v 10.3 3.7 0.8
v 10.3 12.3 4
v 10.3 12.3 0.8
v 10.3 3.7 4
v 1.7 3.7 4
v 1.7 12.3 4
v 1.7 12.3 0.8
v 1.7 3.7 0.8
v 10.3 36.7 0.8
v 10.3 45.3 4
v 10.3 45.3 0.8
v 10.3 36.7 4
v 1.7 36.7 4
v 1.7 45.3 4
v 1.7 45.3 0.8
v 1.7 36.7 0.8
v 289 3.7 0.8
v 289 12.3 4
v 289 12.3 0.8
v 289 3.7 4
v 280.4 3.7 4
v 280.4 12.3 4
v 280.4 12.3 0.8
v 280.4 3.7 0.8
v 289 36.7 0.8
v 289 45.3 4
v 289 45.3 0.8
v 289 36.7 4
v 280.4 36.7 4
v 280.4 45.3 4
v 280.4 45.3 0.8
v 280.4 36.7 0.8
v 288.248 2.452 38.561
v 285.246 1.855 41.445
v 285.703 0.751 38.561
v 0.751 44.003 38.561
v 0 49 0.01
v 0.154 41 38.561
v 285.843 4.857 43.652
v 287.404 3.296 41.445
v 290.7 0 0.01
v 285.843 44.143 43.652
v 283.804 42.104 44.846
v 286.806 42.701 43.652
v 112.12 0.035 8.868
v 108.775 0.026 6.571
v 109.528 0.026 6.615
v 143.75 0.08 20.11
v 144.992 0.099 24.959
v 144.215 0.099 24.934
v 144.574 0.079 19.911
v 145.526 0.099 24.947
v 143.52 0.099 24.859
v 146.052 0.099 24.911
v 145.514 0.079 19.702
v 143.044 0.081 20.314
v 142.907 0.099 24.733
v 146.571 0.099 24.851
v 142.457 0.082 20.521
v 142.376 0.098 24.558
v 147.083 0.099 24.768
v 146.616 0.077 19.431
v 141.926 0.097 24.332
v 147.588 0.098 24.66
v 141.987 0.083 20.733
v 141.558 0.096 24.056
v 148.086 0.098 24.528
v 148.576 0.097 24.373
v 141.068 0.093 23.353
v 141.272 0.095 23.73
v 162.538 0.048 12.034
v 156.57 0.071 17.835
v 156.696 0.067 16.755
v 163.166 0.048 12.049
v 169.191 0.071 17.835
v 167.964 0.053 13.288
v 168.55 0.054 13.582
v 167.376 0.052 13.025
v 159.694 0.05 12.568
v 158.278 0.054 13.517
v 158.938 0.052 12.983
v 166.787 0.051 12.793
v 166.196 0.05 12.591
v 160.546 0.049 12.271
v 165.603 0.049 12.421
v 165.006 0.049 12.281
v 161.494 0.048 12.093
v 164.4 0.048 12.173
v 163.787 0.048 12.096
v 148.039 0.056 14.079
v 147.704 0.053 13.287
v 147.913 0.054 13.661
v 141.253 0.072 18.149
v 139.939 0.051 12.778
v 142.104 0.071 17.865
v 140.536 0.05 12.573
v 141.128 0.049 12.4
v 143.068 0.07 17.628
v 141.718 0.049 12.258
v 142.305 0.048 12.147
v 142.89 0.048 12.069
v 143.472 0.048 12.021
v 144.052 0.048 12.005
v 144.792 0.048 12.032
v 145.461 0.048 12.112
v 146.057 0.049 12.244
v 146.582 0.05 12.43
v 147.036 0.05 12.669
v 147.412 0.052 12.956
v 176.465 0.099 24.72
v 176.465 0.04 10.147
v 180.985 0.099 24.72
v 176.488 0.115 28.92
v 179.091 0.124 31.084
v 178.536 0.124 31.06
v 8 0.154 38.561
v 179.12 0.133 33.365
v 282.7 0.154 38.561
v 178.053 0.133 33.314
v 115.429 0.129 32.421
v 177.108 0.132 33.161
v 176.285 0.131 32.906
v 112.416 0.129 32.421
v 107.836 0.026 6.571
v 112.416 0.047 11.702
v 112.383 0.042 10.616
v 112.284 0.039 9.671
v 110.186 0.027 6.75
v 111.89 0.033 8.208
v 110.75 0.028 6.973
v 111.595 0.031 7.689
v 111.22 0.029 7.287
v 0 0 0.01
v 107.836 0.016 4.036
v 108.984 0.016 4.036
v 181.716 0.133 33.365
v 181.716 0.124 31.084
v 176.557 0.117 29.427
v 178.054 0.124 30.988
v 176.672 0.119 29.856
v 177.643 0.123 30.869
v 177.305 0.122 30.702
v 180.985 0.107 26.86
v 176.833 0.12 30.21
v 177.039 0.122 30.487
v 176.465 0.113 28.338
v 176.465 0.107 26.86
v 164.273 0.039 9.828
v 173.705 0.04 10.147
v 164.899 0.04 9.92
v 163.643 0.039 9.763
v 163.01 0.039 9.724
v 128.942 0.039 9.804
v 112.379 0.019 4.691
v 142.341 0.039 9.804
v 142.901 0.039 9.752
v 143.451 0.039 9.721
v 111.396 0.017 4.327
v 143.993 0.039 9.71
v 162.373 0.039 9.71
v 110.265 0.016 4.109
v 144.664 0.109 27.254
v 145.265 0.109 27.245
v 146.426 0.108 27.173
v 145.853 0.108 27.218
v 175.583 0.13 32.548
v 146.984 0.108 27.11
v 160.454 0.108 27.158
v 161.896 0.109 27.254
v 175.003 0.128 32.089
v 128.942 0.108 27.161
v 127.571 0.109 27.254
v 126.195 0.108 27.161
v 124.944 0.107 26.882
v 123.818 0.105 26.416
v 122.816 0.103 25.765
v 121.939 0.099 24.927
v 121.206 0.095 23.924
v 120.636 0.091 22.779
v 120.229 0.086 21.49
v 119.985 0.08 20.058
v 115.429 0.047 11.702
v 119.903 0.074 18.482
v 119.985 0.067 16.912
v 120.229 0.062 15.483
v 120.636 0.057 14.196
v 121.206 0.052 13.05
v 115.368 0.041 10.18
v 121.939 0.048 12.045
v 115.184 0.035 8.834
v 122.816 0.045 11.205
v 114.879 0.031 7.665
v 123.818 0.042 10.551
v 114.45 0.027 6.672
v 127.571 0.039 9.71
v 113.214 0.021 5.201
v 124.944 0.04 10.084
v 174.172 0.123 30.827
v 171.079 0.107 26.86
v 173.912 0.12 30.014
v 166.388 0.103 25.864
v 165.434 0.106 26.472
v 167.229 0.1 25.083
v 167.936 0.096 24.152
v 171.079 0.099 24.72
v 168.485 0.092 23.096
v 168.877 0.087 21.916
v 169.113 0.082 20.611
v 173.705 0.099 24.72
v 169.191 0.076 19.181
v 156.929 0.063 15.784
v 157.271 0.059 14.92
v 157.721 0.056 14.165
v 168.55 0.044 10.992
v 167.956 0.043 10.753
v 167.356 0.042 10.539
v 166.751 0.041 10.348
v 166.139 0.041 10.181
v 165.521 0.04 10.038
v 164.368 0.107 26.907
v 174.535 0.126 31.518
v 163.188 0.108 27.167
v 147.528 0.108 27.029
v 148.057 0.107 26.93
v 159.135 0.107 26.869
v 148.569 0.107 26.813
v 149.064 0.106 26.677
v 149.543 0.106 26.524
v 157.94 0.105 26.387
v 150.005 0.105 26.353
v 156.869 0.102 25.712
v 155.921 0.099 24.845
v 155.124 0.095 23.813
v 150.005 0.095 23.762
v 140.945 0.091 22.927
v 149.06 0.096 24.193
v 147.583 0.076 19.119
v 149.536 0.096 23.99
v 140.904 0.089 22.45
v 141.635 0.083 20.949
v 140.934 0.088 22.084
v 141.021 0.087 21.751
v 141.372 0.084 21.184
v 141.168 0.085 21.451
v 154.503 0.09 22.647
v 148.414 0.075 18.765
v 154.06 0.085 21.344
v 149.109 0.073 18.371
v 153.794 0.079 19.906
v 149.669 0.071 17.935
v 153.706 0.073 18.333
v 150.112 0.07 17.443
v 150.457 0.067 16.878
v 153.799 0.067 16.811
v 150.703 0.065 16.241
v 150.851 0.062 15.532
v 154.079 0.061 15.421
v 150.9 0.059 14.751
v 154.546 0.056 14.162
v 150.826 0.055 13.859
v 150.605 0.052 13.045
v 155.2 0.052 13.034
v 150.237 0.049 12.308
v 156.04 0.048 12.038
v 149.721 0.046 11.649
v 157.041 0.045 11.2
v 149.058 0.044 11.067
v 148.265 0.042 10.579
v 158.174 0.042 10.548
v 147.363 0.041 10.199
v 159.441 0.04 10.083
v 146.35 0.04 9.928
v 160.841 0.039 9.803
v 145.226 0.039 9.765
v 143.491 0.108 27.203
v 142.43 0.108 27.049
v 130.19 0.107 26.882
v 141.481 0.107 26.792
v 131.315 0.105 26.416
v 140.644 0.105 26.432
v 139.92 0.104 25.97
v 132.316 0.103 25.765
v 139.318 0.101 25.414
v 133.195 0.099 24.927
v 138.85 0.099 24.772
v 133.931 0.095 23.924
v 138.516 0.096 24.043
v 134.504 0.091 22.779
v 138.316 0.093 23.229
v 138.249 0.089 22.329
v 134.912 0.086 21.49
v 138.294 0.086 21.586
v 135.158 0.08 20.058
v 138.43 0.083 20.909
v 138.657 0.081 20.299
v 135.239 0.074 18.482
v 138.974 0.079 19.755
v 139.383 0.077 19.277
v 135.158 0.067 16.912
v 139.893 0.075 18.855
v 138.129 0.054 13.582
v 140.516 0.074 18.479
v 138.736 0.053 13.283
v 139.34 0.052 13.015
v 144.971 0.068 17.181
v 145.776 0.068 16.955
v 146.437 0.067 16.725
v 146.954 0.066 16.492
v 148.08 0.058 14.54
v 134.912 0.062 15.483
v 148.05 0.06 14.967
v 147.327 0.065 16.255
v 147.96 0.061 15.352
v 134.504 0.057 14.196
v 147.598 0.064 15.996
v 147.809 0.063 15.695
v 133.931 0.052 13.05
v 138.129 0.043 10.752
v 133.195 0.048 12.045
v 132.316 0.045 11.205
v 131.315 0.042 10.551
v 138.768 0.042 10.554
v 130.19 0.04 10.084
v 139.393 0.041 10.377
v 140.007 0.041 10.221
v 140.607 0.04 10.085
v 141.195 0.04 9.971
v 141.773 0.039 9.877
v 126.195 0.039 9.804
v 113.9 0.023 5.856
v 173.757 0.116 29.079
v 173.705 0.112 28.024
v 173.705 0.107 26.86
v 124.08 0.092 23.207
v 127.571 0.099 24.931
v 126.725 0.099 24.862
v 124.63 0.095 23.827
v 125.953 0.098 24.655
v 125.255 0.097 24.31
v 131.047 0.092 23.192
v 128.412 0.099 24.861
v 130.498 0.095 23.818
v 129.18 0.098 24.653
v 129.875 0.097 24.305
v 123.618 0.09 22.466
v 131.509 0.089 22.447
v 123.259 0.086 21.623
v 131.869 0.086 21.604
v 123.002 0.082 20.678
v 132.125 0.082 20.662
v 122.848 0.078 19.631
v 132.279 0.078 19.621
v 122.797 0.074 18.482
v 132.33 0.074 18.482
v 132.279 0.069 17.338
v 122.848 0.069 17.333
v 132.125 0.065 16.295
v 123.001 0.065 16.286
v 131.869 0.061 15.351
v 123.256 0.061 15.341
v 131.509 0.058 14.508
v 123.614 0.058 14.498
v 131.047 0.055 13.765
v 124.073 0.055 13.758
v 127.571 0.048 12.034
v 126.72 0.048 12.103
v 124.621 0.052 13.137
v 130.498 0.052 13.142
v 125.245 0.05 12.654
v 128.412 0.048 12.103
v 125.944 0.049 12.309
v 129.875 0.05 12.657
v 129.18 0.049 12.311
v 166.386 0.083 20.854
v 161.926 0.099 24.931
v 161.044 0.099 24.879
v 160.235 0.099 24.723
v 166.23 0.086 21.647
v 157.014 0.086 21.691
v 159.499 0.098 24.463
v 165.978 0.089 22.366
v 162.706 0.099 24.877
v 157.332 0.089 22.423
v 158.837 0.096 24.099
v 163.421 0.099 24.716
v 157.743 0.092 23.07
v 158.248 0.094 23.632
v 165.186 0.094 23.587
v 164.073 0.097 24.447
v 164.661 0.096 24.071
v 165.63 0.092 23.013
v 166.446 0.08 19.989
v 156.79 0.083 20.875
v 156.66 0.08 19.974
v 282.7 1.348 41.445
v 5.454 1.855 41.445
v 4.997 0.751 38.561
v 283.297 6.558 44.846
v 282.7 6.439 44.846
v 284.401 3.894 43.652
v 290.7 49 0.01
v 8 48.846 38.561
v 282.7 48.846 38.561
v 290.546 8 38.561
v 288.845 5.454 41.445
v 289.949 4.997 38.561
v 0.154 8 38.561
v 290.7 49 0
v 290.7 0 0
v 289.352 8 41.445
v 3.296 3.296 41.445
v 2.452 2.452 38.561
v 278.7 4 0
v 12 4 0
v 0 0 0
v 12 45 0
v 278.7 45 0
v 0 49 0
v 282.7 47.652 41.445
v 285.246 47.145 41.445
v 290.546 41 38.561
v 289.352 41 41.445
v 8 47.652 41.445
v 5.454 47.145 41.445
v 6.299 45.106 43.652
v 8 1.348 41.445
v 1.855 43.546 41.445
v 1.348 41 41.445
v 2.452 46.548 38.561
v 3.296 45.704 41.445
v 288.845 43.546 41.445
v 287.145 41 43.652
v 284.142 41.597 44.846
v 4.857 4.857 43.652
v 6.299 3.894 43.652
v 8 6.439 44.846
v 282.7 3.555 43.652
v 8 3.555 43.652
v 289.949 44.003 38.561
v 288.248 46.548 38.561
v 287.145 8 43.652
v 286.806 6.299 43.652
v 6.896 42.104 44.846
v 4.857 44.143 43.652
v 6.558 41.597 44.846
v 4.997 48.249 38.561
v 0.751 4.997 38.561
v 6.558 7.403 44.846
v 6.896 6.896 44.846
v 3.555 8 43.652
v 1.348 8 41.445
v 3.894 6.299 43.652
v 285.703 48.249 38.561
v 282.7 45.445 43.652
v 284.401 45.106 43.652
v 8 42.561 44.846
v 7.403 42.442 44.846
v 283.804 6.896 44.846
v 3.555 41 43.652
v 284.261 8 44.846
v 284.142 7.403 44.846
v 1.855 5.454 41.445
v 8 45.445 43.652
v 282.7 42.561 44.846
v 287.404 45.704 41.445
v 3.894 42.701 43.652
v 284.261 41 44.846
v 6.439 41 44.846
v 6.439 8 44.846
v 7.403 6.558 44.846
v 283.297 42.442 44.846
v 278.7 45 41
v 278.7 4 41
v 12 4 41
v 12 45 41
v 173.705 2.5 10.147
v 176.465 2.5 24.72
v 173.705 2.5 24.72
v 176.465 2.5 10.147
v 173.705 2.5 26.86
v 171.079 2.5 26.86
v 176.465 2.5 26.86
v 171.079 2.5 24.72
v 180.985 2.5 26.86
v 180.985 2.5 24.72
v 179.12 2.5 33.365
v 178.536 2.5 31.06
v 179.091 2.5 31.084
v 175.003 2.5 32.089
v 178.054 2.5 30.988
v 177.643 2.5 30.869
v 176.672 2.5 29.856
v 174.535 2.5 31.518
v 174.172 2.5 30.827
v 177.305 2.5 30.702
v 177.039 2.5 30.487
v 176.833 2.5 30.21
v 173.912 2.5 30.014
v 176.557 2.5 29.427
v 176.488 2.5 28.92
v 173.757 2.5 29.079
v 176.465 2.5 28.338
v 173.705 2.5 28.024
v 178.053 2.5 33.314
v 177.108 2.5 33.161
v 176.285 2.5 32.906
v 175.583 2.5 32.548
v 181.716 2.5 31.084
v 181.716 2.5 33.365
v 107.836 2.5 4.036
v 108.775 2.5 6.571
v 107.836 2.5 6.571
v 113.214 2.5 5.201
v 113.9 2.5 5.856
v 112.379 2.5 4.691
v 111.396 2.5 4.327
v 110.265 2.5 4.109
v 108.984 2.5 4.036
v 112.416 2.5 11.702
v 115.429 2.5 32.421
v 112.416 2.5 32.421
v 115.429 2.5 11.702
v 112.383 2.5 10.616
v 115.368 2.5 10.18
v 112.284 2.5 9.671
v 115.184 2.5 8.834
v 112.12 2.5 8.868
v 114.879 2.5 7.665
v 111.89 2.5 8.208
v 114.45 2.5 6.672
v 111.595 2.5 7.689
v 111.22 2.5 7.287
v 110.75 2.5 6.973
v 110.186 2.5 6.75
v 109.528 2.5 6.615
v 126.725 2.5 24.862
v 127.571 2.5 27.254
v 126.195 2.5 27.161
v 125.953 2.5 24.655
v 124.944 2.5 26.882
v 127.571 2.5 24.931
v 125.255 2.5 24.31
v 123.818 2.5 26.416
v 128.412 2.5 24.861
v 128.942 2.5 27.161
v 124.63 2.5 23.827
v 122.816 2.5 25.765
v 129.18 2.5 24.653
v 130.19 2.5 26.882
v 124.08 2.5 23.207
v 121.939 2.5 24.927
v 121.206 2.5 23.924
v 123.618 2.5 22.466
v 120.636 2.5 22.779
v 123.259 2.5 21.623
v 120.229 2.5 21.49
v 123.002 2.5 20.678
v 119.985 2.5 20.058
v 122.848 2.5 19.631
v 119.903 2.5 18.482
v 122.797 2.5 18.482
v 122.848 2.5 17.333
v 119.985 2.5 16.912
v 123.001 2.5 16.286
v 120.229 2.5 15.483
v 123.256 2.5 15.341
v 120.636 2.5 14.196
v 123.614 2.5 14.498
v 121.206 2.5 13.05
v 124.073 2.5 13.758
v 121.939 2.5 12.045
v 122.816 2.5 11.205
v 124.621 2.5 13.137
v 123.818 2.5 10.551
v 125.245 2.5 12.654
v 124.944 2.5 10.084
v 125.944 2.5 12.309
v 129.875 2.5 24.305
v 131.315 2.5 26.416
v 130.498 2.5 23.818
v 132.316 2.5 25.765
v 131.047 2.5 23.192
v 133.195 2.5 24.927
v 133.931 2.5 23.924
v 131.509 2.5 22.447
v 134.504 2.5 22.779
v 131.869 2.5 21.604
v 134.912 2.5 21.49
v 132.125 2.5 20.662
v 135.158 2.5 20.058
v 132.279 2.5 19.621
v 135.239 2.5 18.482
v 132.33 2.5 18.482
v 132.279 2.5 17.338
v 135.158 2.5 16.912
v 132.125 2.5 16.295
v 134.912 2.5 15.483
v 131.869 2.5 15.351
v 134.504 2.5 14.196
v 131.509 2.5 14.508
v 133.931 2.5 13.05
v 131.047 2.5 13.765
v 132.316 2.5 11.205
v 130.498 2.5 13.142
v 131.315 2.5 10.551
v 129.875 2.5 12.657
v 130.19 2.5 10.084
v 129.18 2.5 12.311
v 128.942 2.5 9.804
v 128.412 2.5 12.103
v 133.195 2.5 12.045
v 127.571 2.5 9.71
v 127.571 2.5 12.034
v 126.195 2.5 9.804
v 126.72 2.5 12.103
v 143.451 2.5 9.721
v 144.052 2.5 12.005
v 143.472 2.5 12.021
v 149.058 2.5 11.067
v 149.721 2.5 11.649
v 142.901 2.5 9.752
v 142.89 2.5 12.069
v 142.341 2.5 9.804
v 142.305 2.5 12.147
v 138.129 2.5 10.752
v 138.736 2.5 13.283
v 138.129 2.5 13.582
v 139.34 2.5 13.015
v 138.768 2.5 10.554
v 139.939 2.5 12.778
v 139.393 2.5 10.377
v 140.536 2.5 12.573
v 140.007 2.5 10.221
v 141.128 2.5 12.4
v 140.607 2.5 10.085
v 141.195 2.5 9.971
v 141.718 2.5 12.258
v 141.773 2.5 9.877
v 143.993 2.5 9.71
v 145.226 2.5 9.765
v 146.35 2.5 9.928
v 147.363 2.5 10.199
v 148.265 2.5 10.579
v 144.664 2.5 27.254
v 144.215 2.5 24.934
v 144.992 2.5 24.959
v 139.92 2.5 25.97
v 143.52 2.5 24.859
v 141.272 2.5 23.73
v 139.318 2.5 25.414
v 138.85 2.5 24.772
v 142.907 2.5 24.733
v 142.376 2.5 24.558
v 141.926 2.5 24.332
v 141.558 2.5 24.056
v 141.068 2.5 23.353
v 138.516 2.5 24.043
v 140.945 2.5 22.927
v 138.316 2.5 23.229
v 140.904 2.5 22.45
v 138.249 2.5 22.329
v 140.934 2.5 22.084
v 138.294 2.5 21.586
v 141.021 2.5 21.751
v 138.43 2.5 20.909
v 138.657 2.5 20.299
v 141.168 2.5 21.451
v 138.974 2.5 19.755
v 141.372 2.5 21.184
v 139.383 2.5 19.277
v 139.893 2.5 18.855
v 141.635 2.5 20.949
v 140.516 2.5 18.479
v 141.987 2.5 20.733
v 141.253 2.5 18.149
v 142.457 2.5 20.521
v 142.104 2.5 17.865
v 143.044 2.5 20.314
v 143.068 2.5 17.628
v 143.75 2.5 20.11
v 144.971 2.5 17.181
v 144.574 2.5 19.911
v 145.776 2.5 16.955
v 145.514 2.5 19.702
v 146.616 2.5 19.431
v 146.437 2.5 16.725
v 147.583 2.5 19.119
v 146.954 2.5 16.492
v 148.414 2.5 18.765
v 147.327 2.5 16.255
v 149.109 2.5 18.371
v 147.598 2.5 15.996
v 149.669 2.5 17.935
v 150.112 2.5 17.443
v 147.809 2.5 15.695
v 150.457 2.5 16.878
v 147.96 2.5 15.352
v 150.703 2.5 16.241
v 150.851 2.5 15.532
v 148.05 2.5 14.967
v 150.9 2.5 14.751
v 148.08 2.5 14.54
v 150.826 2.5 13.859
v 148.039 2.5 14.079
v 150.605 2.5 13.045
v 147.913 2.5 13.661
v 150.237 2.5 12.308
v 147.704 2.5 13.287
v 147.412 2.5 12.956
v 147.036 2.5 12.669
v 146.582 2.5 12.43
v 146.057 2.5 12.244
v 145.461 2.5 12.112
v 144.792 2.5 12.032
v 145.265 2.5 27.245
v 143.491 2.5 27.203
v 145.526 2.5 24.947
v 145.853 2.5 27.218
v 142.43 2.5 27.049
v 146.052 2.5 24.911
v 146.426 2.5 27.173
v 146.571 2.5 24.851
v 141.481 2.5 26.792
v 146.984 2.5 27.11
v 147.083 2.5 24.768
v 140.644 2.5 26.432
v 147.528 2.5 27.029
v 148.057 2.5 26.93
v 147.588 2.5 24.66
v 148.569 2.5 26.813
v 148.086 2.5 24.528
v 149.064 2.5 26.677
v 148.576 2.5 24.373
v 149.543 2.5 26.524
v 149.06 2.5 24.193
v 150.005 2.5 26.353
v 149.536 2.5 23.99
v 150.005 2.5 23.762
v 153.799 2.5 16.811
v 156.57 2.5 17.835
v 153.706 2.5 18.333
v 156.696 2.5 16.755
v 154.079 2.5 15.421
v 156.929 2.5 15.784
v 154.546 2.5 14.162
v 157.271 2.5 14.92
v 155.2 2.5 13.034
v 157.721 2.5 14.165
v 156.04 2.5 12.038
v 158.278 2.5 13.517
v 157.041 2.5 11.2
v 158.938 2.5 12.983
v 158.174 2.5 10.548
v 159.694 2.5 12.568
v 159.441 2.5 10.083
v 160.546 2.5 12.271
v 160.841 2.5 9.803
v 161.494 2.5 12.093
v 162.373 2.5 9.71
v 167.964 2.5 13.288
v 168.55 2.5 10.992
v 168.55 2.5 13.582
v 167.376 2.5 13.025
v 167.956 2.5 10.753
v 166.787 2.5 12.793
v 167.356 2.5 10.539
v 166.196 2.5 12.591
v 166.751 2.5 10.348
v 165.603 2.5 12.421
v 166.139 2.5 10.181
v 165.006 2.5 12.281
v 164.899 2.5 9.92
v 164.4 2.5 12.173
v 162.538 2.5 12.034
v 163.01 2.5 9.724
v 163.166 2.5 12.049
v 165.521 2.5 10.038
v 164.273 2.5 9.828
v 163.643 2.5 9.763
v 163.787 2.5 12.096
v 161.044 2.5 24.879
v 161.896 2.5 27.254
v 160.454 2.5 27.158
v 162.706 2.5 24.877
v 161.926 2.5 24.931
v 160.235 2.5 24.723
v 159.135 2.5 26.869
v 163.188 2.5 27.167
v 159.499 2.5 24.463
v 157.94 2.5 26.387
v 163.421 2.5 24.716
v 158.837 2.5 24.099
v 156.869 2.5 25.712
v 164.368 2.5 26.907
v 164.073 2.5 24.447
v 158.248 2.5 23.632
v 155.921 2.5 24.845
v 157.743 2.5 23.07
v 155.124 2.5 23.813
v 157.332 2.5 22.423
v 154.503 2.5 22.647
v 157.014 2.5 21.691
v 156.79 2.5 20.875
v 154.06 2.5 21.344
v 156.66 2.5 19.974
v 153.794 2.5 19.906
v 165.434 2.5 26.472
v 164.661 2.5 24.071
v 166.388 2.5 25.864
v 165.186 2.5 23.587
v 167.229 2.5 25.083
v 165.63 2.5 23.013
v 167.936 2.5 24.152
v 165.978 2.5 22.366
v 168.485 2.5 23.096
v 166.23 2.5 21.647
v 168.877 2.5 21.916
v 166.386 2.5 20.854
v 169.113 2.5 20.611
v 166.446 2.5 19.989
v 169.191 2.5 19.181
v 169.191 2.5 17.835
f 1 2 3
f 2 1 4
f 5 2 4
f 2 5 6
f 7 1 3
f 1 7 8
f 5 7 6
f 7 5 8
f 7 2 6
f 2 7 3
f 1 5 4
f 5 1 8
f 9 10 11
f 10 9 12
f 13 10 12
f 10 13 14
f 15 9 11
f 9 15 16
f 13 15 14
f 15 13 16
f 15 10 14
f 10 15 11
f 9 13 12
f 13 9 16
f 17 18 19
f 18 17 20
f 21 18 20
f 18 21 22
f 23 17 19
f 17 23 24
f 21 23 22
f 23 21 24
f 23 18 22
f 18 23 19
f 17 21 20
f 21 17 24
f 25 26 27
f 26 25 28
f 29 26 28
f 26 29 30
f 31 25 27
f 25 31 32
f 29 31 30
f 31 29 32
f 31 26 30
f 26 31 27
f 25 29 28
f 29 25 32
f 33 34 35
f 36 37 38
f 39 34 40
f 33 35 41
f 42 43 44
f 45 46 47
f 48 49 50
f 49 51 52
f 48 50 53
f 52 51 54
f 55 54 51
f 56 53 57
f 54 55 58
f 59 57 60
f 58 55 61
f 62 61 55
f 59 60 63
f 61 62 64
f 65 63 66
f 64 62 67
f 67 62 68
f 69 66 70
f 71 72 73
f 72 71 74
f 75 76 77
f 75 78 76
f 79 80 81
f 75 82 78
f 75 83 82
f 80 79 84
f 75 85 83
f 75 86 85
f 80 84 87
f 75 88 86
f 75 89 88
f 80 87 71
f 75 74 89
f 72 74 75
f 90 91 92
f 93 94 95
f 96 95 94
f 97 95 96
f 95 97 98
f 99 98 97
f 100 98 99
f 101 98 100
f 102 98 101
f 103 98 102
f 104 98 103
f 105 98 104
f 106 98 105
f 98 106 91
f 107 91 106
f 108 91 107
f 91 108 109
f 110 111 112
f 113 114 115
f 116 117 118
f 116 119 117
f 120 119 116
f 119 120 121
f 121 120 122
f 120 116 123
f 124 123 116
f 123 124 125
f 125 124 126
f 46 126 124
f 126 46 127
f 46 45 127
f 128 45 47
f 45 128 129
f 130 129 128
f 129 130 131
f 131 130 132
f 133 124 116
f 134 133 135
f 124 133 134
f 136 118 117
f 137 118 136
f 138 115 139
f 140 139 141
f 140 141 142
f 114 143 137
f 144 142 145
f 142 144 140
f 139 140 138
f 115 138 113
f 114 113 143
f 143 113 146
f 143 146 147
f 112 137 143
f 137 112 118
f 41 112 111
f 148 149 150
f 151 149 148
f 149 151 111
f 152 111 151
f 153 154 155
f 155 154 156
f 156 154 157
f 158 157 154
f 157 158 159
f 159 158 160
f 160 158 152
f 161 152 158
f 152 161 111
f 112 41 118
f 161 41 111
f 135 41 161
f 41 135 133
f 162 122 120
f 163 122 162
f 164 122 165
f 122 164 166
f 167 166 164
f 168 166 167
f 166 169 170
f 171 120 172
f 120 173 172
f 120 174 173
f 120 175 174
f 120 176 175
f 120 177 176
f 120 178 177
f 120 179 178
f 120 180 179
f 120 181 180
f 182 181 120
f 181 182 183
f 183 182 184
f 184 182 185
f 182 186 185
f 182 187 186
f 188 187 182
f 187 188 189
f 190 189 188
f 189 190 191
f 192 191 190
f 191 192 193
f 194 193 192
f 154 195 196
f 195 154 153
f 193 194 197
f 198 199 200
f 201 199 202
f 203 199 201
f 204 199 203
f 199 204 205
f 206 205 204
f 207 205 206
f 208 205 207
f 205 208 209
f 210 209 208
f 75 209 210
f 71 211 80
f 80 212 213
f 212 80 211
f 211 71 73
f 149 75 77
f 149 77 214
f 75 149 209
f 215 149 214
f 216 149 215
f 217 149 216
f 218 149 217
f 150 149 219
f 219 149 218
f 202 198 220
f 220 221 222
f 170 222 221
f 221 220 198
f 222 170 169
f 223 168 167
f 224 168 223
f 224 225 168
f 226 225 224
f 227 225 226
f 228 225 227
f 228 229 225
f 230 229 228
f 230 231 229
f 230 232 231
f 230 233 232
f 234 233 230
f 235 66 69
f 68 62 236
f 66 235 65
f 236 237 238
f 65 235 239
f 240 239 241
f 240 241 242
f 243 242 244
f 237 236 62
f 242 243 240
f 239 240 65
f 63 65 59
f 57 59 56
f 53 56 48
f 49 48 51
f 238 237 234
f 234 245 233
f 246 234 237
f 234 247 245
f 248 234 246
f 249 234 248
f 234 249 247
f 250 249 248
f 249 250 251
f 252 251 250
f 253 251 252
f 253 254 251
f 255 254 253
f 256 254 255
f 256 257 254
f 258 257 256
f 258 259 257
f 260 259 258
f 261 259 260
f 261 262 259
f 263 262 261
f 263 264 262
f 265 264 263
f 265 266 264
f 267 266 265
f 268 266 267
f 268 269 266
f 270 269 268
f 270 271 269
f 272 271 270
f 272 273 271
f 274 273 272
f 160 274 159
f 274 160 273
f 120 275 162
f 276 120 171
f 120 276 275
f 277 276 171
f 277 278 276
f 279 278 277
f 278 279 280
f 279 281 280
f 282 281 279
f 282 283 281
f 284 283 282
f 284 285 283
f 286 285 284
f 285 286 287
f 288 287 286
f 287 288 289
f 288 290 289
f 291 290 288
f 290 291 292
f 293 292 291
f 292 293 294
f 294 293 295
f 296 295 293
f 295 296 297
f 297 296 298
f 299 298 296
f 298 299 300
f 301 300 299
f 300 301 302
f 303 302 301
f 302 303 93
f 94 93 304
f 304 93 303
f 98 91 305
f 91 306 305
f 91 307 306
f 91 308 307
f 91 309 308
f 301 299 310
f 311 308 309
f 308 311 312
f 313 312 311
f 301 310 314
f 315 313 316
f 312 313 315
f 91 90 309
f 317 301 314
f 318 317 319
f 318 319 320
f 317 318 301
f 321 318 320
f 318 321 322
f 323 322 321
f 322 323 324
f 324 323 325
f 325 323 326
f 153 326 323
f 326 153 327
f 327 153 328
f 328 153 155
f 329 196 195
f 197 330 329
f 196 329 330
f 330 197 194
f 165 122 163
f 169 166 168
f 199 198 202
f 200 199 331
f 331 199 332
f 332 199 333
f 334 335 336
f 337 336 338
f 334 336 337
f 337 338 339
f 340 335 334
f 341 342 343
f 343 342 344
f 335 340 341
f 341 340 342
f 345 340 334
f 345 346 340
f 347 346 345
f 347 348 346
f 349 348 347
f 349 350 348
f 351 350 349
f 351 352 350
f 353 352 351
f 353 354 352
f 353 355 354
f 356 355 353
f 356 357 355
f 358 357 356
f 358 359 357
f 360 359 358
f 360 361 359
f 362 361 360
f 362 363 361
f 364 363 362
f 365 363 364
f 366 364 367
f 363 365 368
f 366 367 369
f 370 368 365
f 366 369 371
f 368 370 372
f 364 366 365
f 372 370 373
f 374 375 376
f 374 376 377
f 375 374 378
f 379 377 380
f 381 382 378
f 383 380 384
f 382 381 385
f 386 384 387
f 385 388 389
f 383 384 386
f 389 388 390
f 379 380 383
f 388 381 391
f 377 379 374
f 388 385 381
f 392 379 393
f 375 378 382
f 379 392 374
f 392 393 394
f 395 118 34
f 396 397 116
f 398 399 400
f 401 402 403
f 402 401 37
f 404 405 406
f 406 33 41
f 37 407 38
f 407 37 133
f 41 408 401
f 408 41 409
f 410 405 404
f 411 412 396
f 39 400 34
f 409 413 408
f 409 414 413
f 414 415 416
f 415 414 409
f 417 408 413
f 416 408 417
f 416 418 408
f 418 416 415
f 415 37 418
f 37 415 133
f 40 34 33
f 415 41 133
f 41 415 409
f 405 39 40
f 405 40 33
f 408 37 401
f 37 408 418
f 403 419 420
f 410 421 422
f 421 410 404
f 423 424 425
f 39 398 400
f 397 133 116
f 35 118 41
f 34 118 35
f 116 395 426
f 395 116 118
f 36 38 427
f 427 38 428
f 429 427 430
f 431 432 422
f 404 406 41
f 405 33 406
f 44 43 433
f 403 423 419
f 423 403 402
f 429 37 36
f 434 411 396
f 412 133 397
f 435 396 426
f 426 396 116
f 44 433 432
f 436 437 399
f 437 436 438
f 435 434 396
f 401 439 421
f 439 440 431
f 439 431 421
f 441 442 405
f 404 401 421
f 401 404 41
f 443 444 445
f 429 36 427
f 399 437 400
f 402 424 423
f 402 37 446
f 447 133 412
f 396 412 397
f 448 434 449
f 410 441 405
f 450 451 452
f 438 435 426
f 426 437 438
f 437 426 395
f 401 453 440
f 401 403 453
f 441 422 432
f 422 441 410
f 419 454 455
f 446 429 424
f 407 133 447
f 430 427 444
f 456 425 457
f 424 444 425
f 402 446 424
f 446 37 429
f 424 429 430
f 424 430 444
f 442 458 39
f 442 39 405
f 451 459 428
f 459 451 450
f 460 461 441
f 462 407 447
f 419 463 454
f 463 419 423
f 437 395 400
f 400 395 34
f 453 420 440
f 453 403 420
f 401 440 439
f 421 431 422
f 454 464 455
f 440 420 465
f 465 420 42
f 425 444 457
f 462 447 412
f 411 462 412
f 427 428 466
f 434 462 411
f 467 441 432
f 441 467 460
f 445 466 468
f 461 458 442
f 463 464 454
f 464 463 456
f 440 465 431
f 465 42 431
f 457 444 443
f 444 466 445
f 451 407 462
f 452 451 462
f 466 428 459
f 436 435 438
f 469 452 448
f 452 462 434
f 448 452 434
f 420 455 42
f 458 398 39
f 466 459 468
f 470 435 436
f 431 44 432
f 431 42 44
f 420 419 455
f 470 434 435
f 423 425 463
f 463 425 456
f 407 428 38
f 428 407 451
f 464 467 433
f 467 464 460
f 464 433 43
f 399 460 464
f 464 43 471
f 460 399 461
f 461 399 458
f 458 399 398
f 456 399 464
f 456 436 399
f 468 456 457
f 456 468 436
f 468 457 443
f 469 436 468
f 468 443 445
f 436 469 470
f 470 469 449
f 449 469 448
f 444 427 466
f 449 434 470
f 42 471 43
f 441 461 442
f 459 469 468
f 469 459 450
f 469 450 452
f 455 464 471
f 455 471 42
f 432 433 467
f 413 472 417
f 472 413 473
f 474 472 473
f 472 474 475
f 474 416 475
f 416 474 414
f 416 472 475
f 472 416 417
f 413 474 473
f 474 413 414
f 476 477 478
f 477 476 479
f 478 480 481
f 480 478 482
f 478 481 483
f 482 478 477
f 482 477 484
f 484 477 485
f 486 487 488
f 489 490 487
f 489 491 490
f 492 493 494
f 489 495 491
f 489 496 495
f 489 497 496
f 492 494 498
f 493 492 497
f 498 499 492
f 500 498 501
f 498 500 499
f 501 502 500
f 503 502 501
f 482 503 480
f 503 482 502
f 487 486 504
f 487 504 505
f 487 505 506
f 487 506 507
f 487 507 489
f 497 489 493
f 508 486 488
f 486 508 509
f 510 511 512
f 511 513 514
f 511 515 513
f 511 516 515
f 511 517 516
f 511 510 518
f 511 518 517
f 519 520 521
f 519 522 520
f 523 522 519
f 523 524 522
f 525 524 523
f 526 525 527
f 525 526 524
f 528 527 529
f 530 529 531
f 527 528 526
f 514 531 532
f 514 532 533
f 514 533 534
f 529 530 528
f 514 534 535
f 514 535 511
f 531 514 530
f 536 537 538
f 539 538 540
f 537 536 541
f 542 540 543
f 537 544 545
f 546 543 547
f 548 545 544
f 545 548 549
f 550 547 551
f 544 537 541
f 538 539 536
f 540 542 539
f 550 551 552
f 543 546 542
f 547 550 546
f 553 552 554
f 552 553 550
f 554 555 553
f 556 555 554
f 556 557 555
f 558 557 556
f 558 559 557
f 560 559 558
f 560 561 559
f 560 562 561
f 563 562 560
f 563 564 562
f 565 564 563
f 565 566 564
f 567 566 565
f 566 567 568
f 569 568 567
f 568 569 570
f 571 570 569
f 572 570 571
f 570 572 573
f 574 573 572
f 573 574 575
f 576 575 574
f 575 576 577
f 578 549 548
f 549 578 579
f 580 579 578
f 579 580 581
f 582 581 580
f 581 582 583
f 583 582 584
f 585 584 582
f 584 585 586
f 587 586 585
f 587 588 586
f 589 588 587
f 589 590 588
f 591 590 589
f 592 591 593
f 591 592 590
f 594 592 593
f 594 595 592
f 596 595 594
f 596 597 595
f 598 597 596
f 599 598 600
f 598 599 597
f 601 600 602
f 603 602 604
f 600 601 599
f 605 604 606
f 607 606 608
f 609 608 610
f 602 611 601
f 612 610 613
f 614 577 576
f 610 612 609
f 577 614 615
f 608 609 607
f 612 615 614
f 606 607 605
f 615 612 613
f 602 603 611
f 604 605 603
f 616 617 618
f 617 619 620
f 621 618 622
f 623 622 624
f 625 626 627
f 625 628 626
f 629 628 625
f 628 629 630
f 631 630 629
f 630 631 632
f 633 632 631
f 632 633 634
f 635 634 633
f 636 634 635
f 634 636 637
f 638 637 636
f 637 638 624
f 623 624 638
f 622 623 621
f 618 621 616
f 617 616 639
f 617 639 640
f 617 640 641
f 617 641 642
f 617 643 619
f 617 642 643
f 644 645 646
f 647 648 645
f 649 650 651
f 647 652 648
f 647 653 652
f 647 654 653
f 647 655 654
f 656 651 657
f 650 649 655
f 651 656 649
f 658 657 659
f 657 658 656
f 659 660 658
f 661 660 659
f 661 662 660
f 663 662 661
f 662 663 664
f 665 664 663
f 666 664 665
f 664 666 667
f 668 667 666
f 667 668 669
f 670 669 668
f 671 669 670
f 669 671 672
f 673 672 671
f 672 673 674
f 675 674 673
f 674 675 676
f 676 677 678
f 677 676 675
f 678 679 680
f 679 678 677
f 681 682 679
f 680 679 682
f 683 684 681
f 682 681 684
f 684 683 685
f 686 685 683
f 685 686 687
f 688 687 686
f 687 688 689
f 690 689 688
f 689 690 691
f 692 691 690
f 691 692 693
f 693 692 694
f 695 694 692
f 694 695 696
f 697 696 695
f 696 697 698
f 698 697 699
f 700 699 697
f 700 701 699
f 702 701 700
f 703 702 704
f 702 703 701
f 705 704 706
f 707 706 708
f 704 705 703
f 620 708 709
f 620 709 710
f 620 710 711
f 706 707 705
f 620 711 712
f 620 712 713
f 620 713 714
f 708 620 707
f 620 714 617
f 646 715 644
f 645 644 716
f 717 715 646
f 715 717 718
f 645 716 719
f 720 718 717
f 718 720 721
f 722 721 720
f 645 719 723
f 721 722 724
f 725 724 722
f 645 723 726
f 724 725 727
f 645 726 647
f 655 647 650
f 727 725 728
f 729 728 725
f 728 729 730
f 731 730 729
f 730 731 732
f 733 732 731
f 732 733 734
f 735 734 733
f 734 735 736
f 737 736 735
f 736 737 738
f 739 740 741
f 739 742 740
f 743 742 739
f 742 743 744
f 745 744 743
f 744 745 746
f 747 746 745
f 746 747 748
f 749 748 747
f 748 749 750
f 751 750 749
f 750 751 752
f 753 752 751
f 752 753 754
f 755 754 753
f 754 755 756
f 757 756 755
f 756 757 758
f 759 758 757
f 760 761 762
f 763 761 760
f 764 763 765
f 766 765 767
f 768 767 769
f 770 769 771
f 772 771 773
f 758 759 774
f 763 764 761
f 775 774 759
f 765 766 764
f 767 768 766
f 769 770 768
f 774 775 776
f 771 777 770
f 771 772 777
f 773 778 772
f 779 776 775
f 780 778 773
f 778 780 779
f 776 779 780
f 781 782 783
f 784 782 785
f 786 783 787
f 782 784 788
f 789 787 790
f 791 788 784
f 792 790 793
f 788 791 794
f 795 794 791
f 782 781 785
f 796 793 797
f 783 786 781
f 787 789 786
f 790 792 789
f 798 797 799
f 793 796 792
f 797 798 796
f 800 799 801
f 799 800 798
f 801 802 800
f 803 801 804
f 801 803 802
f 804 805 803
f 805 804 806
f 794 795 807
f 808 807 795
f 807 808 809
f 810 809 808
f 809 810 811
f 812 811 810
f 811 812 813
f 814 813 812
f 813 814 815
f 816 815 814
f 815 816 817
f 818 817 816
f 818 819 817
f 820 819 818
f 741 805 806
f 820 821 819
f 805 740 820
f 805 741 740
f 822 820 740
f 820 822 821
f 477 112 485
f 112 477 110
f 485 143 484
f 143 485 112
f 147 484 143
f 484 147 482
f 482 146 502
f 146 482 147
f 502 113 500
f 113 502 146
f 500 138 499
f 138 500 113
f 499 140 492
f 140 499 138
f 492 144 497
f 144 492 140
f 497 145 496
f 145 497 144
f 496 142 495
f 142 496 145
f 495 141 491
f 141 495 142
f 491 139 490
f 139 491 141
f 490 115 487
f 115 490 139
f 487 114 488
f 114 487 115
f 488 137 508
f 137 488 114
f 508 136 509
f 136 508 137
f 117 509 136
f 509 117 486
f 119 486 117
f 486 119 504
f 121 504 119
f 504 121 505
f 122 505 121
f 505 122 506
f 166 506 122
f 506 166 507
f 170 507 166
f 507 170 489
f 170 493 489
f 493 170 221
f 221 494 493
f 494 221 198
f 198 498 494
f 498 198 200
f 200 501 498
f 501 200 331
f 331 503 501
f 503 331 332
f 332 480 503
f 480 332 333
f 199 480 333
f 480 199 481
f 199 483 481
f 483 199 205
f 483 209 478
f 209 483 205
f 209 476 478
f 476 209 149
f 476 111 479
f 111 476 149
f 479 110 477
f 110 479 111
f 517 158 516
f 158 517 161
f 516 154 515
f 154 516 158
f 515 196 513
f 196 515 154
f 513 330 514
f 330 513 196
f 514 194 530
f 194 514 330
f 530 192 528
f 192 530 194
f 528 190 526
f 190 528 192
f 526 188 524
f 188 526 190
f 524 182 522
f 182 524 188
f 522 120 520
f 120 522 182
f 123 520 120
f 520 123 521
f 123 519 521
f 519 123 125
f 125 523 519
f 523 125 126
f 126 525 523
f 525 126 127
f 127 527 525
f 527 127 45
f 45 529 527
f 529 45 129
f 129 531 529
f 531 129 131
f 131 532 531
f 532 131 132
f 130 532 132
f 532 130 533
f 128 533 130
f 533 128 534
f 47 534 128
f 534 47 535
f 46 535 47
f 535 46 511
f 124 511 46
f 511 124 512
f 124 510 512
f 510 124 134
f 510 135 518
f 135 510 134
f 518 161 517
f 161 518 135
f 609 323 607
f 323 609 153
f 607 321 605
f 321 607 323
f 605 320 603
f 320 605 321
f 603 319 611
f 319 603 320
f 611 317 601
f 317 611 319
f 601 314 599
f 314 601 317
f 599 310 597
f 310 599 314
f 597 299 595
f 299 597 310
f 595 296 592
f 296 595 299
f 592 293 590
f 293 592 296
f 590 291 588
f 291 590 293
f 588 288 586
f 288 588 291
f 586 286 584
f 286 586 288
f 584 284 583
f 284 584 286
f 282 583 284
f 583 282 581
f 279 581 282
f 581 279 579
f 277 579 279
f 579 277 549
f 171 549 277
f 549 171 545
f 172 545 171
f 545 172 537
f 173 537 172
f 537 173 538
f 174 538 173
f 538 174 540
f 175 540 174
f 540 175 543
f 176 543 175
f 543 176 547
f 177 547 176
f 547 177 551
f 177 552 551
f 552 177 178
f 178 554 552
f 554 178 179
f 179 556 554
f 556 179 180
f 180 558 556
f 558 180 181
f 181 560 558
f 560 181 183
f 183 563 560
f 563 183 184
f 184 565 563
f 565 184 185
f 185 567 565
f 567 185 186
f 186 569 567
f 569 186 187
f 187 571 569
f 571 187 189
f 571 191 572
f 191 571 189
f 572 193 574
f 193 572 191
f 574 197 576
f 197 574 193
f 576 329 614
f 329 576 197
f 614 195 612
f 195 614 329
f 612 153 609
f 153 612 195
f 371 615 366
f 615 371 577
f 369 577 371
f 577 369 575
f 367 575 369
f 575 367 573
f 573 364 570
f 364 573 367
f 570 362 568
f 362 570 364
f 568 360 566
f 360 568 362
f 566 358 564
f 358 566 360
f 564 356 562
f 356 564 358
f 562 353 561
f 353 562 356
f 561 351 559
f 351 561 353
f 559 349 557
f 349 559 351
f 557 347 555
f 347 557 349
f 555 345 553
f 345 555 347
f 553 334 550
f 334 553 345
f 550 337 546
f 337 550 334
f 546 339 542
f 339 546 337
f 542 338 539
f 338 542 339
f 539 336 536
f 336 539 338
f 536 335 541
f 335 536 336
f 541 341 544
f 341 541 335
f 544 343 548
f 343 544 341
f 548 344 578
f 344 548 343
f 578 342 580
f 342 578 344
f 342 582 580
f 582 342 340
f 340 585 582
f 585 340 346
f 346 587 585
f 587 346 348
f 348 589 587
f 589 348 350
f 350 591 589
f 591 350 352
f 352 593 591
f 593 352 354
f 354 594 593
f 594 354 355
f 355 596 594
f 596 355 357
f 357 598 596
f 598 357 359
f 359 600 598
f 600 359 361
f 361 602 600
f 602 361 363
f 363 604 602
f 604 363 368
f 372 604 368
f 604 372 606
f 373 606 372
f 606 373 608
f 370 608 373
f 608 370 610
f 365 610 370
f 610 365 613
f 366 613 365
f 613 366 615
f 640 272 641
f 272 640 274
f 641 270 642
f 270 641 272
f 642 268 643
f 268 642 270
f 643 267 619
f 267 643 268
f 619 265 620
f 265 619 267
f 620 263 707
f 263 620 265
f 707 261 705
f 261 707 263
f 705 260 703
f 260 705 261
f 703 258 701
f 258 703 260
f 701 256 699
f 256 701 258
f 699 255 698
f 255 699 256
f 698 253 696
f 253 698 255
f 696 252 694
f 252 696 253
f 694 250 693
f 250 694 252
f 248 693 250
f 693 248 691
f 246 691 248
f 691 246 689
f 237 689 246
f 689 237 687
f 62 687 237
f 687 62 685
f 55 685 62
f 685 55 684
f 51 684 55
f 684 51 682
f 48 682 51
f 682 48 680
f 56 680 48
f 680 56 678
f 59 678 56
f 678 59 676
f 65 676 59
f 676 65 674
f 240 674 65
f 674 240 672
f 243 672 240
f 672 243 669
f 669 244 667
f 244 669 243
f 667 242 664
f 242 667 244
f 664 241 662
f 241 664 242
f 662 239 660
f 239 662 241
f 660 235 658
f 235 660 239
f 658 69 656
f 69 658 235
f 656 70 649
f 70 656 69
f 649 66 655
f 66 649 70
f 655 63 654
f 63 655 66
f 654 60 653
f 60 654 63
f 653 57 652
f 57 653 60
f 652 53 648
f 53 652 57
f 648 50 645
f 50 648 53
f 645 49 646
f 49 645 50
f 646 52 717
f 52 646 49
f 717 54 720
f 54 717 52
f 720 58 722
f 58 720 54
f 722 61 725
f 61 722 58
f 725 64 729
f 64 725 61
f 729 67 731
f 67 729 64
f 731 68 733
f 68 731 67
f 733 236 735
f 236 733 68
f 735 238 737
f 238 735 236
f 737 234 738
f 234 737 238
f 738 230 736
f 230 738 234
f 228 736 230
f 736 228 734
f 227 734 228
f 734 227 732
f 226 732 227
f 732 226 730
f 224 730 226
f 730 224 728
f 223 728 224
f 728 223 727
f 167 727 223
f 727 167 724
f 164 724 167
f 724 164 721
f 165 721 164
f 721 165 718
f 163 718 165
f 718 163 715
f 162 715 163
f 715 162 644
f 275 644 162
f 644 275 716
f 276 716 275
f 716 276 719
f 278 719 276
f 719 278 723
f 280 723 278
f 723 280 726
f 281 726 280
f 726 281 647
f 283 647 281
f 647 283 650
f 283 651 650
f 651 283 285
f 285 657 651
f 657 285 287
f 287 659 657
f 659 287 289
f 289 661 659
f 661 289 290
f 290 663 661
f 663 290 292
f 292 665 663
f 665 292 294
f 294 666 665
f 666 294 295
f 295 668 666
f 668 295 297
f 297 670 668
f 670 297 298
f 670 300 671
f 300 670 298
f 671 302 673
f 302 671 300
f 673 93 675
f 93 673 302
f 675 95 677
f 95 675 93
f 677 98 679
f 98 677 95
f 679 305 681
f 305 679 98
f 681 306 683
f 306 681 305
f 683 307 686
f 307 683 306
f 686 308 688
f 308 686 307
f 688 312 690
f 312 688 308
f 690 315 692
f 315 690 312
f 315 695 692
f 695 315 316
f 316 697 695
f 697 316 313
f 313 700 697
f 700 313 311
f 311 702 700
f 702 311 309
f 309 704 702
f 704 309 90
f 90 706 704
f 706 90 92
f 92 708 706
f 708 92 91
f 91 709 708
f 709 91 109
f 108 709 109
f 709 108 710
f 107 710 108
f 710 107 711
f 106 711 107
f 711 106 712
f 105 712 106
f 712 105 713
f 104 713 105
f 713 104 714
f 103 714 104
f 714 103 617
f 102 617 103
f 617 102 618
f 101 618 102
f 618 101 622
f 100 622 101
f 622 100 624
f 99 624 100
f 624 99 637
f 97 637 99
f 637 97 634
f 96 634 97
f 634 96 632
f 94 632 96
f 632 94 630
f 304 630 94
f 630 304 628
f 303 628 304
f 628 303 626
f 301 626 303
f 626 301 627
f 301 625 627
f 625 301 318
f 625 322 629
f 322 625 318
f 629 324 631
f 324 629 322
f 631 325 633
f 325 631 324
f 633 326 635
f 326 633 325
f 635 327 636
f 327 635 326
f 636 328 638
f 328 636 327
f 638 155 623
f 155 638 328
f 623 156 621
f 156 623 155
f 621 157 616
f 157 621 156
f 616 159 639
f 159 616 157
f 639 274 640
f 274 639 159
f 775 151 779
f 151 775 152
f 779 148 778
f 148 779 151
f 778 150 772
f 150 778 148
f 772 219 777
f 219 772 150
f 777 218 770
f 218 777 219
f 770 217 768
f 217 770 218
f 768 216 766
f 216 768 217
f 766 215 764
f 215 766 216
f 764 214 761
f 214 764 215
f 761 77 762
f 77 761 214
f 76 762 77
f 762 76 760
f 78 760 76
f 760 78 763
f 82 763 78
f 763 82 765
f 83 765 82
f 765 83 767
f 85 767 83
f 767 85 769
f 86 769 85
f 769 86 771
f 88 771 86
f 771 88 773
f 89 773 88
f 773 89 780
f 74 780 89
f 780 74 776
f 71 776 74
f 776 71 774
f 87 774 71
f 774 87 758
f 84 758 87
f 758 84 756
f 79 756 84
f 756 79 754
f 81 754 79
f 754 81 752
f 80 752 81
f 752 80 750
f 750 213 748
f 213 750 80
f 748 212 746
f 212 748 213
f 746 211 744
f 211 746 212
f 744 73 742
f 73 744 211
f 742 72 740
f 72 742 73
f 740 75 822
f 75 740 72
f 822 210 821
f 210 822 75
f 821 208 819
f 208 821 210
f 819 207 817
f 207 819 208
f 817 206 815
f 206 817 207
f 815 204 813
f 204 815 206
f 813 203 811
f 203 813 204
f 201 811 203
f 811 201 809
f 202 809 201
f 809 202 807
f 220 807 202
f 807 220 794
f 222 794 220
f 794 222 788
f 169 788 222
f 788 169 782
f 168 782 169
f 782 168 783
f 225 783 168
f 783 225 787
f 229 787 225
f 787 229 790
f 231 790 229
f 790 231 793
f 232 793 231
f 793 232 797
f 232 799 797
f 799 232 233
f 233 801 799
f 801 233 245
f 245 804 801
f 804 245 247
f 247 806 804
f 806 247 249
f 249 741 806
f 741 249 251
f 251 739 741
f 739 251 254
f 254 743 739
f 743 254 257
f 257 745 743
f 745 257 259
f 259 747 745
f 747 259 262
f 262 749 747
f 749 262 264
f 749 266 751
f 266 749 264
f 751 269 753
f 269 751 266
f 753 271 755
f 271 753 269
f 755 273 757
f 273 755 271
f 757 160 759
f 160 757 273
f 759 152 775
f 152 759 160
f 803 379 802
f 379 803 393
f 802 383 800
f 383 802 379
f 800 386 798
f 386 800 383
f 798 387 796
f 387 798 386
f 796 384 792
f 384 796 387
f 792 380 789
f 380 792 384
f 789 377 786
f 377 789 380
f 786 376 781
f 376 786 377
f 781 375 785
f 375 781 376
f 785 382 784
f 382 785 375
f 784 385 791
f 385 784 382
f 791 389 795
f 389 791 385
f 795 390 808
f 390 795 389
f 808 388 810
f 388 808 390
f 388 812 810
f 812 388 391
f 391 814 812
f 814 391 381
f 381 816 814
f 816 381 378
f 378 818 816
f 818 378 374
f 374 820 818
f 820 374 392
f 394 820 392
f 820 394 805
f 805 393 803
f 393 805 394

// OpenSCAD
// PrimeBind Influencer Cap — Josef
// Standalone cap only. Print ceiling-down (rounded top on bed, open bottom facing up).
// Pause at Z ≈ 41mm → insert 4 magnets → resume → sealed.

// ─── BINDER DIMENSIONS ─────────────────────────────────────────
binder_w   = 264.7;
binder_d   = 39;

// ─── WALLS ─────────────────────────────────────────────────────
fit_gap    = 2.0;
face_wall  = 4.0;
side_wall  = 12.0;

// ─── GEOMETRY ──────────────────────────────────────────────────
inner_w    = binder_w + fit_gap;
inner_d    = binder_d + fit_gap;
outer_w    = inner_w + 2*side_wall;
outer_d    = inner_d + 2*face_wall;
r_edge     = 8.0;

// ─── HEIGHT ────────────────────────────────────────────────────
cap_h      = 45;     // cap internal = 41.275mm

// ─── MAGNETS ───────────────────────────────────────────────────
mag_r        = 4.3;   // 8mm magnet + 0.6mm clearance = drops in easily, sealed by print
mag_dep      = 3.2;
mag_seal     = 0.8;   // sealed skin at junction face — pause before this prints
mag_corner_x = side_wall / 2;
mag_corner_y = 8.0;

// ─── NAME TAG ──────────────────────────────────────────────────
name_text  = "Josef";
name_size  = 22;
name_font  = "Bunken Tech Sans Pro ExBd:style=Italic";
name_depth = 1.5;

$fn = 32;

// ─── ROUNDED BOX — flat bottom edge, rounded top ───────────────
module rrect_flat_bottom(x, y, z, r) {
    hull() {
        cube([x, y, 0.01]);
        for (xi = [r, x-r]) for (yi = [r, y-r])
            translate([xi, yi, z-r]) sphere(r=r, $fn=16);
    }
}

// ─── NAME POCKET (deboss — subtracted from cap body) ───────────
module name_pocket_front() {
    translate([outer_w/2 - 0.2, name_depth + 1, cap_h/2 - 4])
        rotate([90, 0, 0])
            linear_extrude(height = name_depth + 1)
                text(name_text, size = name_size, font = name_font,
                     halign = "center", valign = "center");
}

// ─── NAME INLAY (solid fill — white STL, sits inside deboss cavity) ─
module name_inlay() {
    translate([outer_w/2 - 0.2, name_depth, cap_h/2 - 4])
        rotate([90, 0, 0])
            linear_extrude(height = name_depth)
                text(name_text, size = name_size, font = name_font,
                     halign = "center", valign = "center");
}

// ─── CAP ───────────────────────────────────────────────────────
module cap() {
    difference() {
        rrect_flat_bottom(outer_w, outer_d, cap_h, r_edge);

        // interior: open at bottom, 3mm ceiling at top
        translate([side_wall, face_wall, 0])
            cube([inner_w, inner_d, cap_h - face_wall]);

        // name debossed into front face
        name_pocket_front();

        // 4 corner magnet pockets — square so magnet drops in flat, no tilt/head crash
        // Cap prints CEILING-DOWN → pause at printer Z ≈ 41mm, insert magnets, resume
        for (mx = [mag_corner_x, outer_w - mag_corner_x])
            for (my = [mag_corner_y, outer_d - mag_corner_y])
                translate([mx - mag_r, my - mag_r, mag_seal])
                    cube([mag_r*2, mag_r*2, mag_dep]);
    }
}

// ─── RENDER ────────────────────────────────────────────────────
// EXPORT 1 → cap_josef_black.stl:  set RENDER = "body"
// EXPORT 2 → cap_josef_white.stl:  set RENDER = "text"
RENDER = "body";

if (RENDER == "body") cap();
if (RENDER == "text") name_inlay();
